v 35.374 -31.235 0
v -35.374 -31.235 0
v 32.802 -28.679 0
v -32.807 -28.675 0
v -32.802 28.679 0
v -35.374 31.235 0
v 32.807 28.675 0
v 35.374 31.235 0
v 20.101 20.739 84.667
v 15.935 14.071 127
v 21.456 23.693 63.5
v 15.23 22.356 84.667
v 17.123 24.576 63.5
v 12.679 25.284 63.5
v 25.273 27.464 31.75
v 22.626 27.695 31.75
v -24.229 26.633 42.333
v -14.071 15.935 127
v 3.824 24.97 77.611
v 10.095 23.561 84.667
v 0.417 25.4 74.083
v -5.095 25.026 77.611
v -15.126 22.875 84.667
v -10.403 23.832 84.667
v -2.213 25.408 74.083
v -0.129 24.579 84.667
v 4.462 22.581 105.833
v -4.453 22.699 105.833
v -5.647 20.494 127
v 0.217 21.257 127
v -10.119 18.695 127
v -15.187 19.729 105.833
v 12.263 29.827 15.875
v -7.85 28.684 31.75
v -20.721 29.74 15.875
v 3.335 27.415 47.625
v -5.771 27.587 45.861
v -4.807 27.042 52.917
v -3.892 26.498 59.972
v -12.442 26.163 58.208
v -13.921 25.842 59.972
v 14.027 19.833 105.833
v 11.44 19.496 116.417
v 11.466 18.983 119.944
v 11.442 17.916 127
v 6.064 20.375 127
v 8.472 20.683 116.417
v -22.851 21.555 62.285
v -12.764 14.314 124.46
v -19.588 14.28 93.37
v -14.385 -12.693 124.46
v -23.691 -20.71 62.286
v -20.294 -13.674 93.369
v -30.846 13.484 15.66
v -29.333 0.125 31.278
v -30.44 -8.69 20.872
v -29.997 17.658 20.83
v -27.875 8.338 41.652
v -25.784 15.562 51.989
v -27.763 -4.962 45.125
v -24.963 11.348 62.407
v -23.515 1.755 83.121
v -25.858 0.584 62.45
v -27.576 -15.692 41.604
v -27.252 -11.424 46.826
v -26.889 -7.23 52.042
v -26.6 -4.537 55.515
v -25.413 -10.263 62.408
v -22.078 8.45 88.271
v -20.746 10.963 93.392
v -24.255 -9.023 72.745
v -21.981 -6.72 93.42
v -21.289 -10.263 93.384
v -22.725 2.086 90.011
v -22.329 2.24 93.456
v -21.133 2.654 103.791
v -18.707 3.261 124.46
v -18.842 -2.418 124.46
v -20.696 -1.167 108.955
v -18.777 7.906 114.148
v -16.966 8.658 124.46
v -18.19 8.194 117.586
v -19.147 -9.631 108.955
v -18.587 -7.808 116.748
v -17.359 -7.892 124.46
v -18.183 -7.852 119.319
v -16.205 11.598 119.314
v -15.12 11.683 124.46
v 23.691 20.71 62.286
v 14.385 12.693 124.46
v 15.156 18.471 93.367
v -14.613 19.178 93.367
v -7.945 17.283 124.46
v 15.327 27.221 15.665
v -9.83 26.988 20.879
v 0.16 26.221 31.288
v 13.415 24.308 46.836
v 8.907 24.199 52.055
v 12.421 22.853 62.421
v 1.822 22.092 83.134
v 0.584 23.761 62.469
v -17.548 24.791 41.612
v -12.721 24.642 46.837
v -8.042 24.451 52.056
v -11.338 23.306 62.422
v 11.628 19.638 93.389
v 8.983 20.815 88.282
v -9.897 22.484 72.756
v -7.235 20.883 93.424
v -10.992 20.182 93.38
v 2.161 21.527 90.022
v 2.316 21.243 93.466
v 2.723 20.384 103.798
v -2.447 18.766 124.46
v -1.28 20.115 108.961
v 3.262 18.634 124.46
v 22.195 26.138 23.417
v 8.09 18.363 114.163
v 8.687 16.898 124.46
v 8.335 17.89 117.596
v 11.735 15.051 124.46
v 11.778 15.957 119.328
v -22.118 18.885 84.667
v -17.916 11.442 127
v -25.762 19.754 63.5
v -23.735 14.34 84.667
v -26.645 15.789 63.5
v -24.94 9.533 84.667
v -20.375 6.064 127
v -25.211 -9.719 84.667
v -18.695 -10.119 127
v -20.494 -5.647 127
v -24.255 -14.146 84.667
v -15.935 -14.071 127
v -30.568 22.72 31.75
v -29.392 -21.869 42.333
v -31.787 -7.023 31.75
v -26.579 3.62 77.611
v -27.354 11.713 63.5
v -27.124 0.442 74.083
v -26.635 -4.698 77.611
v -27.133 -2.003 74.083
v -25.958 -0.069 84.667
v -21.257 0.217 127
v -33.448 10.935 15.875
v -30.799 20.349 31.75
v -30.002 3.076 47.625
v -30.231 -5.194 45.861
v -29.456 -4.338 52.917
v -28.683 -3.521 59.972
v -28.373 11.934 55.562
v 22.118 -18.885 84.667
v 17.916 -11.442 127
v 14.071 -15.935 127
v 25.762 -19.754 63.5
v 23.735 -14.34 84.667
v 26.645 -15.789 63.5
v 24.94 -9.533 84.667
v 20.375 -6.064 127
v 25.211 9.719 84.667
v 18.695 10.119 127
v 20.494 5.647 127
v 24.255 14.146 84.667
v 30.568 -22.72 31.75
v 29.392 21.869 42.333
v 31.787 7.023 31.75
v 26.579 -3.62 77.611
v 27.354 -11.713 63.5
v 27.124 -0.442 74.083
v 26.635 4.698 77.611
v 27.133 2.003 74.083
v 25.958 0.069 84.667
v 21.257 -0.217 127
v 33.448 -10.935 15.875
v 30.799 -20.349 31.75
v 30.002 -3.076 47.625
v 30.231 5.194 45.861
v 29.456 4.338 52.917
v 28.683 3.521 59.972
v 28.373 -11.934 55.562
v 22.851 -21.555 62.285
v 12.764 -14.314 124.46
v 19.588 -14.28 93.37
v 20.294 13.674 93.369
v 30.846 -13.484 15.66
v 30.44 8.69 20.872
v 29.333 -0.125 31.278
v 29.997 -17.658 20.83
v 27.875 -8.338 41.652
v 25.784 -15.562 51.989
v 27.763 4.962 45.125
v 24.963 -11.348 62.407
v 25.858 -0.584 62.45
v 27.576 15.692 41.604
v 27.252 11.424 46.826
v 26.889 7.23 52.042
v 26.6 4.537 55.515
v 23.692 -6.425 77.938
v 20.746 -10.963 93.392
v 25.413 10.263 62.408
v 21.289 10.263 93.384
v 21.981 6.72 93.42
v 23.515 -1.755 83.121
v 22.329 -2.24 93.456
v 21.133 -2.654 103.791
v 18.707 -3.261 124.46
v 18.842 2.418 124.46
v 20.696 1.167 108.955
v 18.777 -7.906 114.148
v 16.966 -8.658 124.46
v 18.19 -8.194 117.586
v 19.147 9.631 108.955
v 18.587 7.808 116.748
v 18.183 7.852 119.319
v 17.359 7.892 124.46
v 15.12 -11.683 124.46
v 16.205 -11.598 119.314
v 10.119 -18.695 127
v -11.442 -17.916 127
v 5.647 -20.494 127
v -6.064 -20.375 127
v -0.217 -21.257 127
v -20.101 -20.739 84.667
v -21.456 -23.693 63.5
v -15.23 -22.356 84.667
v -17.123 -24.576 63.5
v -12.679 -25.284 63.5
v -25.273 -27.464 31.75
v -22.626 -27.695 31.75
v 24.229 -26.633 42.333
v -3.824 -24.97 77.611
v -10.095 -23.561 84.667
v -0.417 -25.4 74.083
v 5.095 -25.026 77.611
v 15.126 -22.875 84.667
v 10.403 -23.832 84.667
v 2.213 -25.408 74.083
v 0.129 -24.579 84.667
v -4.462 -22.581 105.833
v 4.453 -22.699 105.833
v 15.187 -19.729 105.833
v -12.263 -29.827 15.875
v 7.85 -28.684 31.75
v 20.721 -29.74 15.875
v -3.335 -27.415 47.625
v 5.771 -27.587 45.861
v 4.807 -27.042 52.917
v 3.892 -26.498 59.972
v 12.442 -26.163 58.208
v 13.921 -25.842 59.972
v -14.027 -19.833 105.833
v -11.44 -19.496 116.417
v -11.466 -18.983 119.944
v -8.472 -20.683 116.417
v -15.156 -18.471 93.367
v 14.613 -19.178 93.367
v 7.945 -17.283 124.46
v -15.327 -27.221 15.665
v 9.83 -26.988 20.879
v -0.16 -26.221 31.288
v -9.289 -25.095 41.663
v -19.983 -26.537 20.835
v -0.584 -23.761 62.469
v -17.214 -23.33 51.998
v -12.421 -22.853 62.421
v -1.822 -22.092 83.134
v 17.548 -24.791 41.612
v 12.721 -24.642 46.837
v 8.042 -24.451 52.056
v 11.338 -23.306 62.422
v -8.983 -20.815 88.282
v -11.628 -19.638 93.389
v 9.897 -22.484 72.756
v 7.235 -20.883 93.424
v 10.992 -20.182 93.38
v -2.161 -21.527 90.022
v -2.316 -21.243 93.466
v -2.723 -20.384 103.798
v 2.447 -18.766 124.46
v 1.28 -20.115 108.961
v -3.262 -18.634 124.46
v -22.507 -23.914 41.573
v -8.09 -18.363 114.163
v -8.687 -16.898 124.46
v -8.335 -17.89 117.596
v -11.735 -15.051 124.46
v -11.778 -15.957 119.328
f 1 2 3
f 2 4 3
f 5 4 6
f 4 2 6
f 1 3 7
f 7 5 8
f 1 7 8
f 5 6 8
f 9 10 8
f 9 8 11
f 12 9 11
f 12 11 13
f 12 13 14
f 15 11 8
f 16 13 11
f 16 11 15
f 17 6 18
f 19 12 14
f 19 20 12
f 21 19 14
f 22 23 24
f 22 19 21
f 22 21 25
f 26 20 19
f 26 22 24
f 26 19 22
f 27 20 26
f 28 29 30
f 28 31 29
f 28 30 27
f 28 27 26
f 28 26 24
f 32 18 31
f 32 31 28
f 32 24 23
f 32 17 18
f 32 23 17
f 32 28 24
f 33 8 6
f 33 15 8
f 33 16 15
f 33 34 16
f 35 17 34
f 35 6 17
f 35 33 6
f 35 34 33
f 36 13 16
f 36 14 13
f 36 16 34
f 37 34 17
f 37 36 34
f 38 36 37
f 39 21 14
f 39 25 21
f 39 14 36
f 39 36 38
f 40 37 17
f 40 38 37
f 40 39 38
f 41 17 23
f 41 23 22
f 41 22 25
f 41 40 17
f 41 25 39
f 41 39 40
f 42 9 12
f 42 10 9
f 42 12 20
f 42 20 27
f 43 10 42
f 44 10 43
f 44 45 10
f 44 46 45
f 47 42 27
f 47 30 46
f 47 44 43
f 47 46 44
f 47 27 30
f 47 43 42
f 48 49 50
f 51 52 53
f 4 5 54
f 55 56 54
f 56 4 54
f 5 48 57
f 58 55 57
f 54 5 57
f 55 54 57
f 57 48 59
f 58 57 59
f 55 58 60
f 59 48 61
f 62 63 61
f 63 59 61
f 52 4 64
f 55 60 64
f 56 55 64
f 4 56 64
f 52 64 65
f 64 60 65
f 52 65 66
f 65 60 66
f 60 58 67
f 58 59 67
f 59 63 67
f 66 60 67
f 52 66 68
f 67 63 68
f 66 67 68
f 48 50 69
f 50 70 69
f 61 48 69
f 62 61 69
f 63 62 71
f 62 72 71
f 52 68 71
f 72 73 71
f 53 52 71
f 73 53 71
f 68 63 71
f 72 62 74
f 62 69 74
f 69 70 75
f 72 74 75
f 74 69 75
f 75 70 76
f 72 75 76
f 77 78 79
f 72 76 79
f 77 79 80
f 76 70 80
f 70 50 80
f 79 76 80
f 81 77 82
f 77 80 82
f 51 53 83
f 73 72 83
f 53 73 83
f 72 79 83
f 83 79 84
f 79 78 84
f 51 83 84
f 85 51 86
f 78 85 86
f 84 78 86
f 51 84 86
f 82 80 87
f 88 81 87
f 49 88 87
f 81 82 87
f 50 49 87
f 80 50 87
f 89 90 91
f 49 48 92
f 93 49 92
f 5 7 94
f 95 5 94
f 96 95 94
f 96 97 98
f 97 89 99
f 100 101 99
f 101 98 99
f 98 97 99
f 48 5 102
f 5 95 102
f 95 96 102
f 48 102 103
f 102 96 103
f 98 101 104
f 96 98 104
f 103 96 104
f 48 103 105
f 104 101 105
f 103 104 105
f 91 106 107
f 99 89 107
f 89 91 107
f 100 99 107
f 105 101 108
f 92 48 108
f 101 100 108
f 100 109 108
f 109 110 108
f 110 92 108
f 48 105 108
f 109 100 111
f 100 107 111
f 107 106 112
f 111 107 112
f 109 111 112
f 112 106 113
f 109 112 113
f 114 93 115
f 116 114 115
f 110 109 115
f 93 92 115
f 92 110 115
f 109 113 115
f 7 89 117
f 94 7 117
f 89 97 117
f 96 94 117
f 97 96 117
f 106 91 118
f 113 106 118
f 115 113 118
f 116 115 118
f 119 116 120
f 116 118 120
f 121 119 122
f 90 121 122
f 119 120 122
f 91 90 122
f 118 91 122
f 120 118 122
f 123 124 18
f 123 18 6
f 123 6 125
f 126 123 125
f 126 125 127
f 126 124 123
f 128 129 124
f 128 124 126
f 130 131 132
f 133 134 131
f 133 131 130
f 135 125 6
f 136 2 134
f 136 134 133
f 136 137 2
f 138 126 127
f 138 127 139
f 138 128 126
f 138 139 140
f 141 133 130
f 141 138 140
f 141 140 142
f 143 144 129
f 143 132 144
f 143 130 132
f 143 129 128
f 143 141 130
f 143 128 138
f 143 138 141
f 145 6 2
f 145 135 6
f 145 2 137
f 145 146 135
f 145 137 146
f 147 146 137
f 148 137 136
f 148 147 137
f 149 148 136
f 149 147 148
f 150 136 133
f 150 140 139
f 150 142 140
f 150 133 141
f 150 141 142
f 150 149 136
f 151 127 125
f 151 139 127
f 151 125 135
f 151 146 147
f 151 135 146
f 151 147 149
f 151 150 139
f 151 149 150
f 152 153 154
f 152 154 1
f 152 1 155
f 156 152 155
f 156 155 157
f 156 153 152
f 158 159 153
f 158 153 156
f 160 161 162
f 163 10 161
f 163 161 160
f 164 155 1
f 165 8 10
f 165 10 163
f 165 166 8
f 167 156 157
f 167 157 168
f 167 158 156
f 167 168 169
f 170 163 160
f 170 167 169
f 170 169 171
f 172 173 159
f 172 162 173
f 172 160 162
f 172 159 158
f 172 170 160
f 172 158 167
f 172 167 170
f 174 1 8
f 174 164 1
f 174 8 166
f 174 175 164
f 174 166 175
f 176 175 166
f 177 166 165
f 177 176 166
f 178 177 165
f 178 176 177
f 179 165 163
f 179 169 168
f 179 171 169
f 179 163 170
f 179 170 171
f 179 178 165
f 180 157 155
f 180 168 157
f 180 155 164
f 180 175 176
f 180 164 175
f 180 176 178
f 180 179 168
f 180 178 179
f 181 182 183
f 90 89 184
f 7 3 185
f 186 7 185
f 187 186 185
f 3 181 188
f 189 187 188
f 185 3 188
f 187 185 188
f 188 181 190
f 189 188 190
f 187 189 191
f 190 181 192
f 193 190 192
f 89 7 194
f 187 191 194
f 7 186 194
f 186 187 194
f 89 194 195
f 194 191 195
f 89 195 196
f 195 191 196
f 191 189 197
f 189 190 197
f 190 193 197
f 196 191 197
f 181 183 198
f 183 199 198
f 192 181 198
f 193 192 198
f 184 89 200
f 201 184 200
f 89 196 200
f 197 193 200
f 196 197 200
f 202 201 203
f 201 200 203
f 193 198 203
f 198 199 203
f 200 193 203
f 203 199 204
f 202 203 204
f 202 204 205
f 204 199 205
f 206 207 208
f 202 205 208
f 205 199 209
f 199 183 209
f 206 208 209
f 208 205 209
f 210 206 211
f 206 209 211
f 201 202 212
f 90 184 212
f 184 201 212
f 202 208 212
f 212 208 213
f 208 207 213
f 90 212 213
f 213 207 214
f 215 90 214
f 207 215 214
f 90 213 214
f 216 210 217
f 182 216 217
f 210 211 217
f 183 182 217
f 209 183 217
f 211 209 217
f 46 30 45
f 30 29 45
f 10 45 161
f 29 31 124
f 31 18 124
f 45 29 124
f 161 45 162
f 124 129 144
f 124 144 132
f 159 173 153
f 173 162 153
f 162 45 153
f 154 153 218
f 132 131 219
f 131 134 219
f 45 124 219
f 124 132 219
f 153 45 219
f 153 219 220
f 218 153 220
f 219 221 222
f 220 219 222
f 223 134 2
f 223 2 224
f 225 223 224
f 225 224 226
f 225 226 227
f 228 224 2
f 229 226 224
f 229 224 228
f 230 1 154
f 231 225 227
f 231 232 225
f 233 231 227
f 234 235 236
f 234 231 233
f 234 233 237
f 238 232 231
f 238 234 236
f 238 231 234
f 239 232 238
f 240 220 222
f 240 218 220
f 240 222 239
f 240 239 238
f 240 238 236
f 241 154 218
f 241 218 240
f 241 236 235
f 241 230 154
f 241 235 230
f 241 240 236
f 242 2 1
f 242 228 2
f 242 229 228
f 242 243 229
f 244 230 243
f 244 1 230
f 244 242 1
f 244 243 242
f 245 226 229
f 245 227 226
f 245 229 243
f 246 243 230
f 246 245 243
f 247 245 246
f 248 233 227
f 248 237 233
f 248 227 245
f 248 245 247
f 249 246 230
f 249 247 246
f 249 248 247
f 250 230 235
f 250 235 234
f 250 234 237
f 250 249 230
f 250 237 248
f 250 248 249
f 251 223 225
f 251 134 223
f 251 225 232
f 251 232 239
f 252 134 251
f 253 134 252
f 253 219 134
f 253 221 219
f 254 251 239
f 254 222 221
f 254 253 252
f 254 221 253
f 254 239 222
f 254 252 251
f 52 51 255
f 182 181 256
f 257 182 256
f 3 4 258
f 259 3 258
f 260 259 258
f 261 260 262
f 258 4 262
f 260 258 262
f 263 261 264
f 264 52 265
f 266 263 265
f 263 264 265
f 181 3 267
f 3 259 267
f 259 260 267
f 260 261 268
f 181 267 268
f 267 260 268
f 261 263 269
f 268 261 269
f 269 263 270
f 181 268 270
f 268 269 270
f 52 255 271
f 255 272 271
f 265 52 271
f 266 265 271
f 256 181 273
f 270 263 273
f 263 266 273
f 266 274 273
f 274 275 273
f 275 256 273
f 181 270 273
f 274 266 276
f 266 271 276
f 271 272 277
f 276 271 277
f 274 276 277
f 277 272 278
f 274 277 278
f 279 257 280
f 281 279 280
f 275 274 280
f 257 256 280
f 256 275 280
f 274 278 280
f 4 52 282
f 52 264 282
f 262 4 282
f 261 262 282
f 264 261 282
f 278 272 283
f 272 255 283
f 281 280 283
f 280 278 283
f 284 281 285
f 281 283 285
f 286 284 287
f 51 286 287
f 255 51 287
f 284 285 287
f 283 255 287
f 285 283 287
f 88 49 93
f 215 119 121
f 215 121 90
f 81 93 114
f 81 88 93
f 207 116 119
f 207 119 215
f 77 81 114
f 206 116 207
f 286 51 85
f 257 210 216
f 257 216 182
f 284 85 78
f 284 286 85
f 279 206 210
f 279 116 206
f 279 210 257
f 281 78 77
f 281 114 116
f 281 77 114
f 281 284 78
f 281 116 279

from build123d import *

# Parameters (mm, degrees)
F0_W = 70.7477629185
F0_H = 62.4708645046
F4_T = 2.54


# Not quite as in the source:
# - the arcs of a loft's sections are written as splines that run evenly, so that the points pair up as in the source's solid
# - a shell that OpenCascade refuses in one call is made with other operations: the cavity is built on its own and cut out


with BuildPart() as f3:
    # F0 (on Top) → F3 section 0
    with BuildSketch(Plane.XY):
        Rectangle(F0_W, F0_H)
    # F2 (on offset) → F3 section 1
    with BuildSketch(Plane.XY.offset(127)):
        with BuildLine():
            add(Edge.make_bspline(
                [(15.9351280148, 14.0708508936), (15.0141929774, 15.1138025832), (13.9905614763, 16.0660265425), (11.7771428565, 17.7525188473), (10.5874104689, 18.4867454911), (8.0875037404, 19.7090157679), (6.7773912146, 20.1970291779), (4.087066391, 20.9081062654), (2.7069206167, 21.13115236), (-0.0704346278, 21.3037099645), (-1.4675754224, 21.2532172075), (-4.2252288833, 20.8806240369), (-5.5856733611, 20.5585328366), (-8.2176499623, 19.6551074376), (-9.4891170049, 19.0737955781), (-11.8942713618, 17.6742560822), (-13.0278992039, 16.8560630523), (-14.0708508936, 15.9351280148)],
                knots=[0, 0, 0, 0, 0.125, 0.125, 0.25, 0.25, 0.375, 0.375, 0.5, 0.5, 0.625, 0.625, 0.75, 0.75, 0.875, 0.875, 1, 1, 1, 1], degree=3))
            add(Edge.make_bspline(
                [(-14.0708508936, 15.9351280148), (-15.1138025832, 15.0141929774), (-16.0660265425, 13.9905614763), (-17.7525188473, 11.7771428565), (-18.4867454911, 10.5874104689), (-19.7090157679, 8.0875037404), (-20.1970291779, 6.7773912146), (-20.9081062654, 4.087066391), (-21.13115236, 2.7069206167), (-21.3037099645, -0.0704346278), (-21.2532172075, -1.4675754224), (-20.8806240369, -4.2252288833), (-20.5585328366, -5.5856733611), (-19.6551074376, -8.2176499623), (-19.0737955781, -9.4891170049), (-17.6742560822, -11.8942713618), (-16.8560630523, -13.0278992039), (-15.9351280148, -14.0708508936)],
                knots=[0, 0, 0, 0, 0.125, 0.125, 0.25, 0.25, 0.375, 0.375, 0.5, 0.5, 0.625, 0.625, 0.75, 0.75, 0.875, 0.875, 1, 1, 1, 1], degree=3))
            add(Edge.make_bspline(
                [(-15.9351280148, -14.0708508936), (-15.0141929774, -15.1138025832), (-13.9905614763, -16.0660265425), (-11.7771428565, -17.7525188473), (-10.5874104689, -18.4867454911), (-8.0875037404, -19.7090157679), (-6.7773912146, -20.1970291779), (-4.087066391, -20.9081062654), (-2.7069206167, -21.13115236), (0.0704346278, -21.3037099645), (1.4675754224, -21.2532172075), (4.2252288833, -20.8806240369), (5.5856733611, -20.5585328366), (8.2176499623, -19.6551074376), (9.4891170049, -19.0737955781), (11.8942713618, -17.6742560822), (13.0278992039, -16.8560630523), (14.0708508936, -15.9351280148)],
                knots=[0, 0, 0, 0, 0.125, 0.125, 0.25, 0.25, 0.375, 0.375, 0.5, 0.5, 0.625, 0.625, 0.75, 0.75, 0.875, 0.875, 1, 1, 1, 1], degree=3))
            add(Edge.make_bspline(
                [(14.0708508936, -15.9351280148), (15.1138025832, -15.0141929774), (16.0660265425, -13.9905614763), (17.7525188473, -11.7771428565), (18.4867454911, -10.5874104689), (19.7090157679, -8.0875037404), (20.1970291779, -6.7773912146), (20.9081062654, -4.087066391), (21.13115236, -2.7069206167), (21.3037099645, 0.0704346278), (21.2532172075, 1.4675754224), (20.8806240369, 4.2252288833), (20.5585328366, 5.5856733611), (19.6551074376, 8.2176499623), (19.0737955781, 9.4891170049), (17.6742560822, 11.8942713618), (16.8560630523, 13.0278992039), (15.9351280148, 14.0708508936)],
                knots=[0, 0, 0, 0, 0.125, 0.125, 0.25, 0.25, 0.375, 0.375, 0.5, 0.5, 0.625, 0.625, 0.75, 0.75, 0.875, 0.875, 1, 1, 1, 1], degree=3))
        make_face()
    loft(ruled=True)

    # F4: shell of thickness 2.54, made by hand


with BuildPart() as f4_core1:
    # F4_t2: copy of F3
    add(f3.part)

    # the walls: a layer under each face that stays
    f4_faces = [f4_core1.faces().sort_by_distance(p)[0] for p in [
        (28.2956563107, -0.6591214972, 63.5),
        (0.6591214972, 26.2264317073, 63.5),
        (-28.2956563107, 0.6591214972, 63.5),
        (-0.6591214972, -26.2264317073, 63.5),
        (0, 0, 127),
    ]]
    thicken(f4_faces, amount=-F4_T, mode=Mode.SUBTRACT)


with BuildPart() as f3_1:
    add(f3.part)

    # what is left inside the walls is the cavity
    f4_cavity = [f4_core1.part.solids().sort_by_distance(p)[0] for p in [
        (-0.40374, -25.381852, 41.586065),
    ]]
    add(f4_cavity, mode=Mode.SUBTRACT)


solid = f3_1.part
